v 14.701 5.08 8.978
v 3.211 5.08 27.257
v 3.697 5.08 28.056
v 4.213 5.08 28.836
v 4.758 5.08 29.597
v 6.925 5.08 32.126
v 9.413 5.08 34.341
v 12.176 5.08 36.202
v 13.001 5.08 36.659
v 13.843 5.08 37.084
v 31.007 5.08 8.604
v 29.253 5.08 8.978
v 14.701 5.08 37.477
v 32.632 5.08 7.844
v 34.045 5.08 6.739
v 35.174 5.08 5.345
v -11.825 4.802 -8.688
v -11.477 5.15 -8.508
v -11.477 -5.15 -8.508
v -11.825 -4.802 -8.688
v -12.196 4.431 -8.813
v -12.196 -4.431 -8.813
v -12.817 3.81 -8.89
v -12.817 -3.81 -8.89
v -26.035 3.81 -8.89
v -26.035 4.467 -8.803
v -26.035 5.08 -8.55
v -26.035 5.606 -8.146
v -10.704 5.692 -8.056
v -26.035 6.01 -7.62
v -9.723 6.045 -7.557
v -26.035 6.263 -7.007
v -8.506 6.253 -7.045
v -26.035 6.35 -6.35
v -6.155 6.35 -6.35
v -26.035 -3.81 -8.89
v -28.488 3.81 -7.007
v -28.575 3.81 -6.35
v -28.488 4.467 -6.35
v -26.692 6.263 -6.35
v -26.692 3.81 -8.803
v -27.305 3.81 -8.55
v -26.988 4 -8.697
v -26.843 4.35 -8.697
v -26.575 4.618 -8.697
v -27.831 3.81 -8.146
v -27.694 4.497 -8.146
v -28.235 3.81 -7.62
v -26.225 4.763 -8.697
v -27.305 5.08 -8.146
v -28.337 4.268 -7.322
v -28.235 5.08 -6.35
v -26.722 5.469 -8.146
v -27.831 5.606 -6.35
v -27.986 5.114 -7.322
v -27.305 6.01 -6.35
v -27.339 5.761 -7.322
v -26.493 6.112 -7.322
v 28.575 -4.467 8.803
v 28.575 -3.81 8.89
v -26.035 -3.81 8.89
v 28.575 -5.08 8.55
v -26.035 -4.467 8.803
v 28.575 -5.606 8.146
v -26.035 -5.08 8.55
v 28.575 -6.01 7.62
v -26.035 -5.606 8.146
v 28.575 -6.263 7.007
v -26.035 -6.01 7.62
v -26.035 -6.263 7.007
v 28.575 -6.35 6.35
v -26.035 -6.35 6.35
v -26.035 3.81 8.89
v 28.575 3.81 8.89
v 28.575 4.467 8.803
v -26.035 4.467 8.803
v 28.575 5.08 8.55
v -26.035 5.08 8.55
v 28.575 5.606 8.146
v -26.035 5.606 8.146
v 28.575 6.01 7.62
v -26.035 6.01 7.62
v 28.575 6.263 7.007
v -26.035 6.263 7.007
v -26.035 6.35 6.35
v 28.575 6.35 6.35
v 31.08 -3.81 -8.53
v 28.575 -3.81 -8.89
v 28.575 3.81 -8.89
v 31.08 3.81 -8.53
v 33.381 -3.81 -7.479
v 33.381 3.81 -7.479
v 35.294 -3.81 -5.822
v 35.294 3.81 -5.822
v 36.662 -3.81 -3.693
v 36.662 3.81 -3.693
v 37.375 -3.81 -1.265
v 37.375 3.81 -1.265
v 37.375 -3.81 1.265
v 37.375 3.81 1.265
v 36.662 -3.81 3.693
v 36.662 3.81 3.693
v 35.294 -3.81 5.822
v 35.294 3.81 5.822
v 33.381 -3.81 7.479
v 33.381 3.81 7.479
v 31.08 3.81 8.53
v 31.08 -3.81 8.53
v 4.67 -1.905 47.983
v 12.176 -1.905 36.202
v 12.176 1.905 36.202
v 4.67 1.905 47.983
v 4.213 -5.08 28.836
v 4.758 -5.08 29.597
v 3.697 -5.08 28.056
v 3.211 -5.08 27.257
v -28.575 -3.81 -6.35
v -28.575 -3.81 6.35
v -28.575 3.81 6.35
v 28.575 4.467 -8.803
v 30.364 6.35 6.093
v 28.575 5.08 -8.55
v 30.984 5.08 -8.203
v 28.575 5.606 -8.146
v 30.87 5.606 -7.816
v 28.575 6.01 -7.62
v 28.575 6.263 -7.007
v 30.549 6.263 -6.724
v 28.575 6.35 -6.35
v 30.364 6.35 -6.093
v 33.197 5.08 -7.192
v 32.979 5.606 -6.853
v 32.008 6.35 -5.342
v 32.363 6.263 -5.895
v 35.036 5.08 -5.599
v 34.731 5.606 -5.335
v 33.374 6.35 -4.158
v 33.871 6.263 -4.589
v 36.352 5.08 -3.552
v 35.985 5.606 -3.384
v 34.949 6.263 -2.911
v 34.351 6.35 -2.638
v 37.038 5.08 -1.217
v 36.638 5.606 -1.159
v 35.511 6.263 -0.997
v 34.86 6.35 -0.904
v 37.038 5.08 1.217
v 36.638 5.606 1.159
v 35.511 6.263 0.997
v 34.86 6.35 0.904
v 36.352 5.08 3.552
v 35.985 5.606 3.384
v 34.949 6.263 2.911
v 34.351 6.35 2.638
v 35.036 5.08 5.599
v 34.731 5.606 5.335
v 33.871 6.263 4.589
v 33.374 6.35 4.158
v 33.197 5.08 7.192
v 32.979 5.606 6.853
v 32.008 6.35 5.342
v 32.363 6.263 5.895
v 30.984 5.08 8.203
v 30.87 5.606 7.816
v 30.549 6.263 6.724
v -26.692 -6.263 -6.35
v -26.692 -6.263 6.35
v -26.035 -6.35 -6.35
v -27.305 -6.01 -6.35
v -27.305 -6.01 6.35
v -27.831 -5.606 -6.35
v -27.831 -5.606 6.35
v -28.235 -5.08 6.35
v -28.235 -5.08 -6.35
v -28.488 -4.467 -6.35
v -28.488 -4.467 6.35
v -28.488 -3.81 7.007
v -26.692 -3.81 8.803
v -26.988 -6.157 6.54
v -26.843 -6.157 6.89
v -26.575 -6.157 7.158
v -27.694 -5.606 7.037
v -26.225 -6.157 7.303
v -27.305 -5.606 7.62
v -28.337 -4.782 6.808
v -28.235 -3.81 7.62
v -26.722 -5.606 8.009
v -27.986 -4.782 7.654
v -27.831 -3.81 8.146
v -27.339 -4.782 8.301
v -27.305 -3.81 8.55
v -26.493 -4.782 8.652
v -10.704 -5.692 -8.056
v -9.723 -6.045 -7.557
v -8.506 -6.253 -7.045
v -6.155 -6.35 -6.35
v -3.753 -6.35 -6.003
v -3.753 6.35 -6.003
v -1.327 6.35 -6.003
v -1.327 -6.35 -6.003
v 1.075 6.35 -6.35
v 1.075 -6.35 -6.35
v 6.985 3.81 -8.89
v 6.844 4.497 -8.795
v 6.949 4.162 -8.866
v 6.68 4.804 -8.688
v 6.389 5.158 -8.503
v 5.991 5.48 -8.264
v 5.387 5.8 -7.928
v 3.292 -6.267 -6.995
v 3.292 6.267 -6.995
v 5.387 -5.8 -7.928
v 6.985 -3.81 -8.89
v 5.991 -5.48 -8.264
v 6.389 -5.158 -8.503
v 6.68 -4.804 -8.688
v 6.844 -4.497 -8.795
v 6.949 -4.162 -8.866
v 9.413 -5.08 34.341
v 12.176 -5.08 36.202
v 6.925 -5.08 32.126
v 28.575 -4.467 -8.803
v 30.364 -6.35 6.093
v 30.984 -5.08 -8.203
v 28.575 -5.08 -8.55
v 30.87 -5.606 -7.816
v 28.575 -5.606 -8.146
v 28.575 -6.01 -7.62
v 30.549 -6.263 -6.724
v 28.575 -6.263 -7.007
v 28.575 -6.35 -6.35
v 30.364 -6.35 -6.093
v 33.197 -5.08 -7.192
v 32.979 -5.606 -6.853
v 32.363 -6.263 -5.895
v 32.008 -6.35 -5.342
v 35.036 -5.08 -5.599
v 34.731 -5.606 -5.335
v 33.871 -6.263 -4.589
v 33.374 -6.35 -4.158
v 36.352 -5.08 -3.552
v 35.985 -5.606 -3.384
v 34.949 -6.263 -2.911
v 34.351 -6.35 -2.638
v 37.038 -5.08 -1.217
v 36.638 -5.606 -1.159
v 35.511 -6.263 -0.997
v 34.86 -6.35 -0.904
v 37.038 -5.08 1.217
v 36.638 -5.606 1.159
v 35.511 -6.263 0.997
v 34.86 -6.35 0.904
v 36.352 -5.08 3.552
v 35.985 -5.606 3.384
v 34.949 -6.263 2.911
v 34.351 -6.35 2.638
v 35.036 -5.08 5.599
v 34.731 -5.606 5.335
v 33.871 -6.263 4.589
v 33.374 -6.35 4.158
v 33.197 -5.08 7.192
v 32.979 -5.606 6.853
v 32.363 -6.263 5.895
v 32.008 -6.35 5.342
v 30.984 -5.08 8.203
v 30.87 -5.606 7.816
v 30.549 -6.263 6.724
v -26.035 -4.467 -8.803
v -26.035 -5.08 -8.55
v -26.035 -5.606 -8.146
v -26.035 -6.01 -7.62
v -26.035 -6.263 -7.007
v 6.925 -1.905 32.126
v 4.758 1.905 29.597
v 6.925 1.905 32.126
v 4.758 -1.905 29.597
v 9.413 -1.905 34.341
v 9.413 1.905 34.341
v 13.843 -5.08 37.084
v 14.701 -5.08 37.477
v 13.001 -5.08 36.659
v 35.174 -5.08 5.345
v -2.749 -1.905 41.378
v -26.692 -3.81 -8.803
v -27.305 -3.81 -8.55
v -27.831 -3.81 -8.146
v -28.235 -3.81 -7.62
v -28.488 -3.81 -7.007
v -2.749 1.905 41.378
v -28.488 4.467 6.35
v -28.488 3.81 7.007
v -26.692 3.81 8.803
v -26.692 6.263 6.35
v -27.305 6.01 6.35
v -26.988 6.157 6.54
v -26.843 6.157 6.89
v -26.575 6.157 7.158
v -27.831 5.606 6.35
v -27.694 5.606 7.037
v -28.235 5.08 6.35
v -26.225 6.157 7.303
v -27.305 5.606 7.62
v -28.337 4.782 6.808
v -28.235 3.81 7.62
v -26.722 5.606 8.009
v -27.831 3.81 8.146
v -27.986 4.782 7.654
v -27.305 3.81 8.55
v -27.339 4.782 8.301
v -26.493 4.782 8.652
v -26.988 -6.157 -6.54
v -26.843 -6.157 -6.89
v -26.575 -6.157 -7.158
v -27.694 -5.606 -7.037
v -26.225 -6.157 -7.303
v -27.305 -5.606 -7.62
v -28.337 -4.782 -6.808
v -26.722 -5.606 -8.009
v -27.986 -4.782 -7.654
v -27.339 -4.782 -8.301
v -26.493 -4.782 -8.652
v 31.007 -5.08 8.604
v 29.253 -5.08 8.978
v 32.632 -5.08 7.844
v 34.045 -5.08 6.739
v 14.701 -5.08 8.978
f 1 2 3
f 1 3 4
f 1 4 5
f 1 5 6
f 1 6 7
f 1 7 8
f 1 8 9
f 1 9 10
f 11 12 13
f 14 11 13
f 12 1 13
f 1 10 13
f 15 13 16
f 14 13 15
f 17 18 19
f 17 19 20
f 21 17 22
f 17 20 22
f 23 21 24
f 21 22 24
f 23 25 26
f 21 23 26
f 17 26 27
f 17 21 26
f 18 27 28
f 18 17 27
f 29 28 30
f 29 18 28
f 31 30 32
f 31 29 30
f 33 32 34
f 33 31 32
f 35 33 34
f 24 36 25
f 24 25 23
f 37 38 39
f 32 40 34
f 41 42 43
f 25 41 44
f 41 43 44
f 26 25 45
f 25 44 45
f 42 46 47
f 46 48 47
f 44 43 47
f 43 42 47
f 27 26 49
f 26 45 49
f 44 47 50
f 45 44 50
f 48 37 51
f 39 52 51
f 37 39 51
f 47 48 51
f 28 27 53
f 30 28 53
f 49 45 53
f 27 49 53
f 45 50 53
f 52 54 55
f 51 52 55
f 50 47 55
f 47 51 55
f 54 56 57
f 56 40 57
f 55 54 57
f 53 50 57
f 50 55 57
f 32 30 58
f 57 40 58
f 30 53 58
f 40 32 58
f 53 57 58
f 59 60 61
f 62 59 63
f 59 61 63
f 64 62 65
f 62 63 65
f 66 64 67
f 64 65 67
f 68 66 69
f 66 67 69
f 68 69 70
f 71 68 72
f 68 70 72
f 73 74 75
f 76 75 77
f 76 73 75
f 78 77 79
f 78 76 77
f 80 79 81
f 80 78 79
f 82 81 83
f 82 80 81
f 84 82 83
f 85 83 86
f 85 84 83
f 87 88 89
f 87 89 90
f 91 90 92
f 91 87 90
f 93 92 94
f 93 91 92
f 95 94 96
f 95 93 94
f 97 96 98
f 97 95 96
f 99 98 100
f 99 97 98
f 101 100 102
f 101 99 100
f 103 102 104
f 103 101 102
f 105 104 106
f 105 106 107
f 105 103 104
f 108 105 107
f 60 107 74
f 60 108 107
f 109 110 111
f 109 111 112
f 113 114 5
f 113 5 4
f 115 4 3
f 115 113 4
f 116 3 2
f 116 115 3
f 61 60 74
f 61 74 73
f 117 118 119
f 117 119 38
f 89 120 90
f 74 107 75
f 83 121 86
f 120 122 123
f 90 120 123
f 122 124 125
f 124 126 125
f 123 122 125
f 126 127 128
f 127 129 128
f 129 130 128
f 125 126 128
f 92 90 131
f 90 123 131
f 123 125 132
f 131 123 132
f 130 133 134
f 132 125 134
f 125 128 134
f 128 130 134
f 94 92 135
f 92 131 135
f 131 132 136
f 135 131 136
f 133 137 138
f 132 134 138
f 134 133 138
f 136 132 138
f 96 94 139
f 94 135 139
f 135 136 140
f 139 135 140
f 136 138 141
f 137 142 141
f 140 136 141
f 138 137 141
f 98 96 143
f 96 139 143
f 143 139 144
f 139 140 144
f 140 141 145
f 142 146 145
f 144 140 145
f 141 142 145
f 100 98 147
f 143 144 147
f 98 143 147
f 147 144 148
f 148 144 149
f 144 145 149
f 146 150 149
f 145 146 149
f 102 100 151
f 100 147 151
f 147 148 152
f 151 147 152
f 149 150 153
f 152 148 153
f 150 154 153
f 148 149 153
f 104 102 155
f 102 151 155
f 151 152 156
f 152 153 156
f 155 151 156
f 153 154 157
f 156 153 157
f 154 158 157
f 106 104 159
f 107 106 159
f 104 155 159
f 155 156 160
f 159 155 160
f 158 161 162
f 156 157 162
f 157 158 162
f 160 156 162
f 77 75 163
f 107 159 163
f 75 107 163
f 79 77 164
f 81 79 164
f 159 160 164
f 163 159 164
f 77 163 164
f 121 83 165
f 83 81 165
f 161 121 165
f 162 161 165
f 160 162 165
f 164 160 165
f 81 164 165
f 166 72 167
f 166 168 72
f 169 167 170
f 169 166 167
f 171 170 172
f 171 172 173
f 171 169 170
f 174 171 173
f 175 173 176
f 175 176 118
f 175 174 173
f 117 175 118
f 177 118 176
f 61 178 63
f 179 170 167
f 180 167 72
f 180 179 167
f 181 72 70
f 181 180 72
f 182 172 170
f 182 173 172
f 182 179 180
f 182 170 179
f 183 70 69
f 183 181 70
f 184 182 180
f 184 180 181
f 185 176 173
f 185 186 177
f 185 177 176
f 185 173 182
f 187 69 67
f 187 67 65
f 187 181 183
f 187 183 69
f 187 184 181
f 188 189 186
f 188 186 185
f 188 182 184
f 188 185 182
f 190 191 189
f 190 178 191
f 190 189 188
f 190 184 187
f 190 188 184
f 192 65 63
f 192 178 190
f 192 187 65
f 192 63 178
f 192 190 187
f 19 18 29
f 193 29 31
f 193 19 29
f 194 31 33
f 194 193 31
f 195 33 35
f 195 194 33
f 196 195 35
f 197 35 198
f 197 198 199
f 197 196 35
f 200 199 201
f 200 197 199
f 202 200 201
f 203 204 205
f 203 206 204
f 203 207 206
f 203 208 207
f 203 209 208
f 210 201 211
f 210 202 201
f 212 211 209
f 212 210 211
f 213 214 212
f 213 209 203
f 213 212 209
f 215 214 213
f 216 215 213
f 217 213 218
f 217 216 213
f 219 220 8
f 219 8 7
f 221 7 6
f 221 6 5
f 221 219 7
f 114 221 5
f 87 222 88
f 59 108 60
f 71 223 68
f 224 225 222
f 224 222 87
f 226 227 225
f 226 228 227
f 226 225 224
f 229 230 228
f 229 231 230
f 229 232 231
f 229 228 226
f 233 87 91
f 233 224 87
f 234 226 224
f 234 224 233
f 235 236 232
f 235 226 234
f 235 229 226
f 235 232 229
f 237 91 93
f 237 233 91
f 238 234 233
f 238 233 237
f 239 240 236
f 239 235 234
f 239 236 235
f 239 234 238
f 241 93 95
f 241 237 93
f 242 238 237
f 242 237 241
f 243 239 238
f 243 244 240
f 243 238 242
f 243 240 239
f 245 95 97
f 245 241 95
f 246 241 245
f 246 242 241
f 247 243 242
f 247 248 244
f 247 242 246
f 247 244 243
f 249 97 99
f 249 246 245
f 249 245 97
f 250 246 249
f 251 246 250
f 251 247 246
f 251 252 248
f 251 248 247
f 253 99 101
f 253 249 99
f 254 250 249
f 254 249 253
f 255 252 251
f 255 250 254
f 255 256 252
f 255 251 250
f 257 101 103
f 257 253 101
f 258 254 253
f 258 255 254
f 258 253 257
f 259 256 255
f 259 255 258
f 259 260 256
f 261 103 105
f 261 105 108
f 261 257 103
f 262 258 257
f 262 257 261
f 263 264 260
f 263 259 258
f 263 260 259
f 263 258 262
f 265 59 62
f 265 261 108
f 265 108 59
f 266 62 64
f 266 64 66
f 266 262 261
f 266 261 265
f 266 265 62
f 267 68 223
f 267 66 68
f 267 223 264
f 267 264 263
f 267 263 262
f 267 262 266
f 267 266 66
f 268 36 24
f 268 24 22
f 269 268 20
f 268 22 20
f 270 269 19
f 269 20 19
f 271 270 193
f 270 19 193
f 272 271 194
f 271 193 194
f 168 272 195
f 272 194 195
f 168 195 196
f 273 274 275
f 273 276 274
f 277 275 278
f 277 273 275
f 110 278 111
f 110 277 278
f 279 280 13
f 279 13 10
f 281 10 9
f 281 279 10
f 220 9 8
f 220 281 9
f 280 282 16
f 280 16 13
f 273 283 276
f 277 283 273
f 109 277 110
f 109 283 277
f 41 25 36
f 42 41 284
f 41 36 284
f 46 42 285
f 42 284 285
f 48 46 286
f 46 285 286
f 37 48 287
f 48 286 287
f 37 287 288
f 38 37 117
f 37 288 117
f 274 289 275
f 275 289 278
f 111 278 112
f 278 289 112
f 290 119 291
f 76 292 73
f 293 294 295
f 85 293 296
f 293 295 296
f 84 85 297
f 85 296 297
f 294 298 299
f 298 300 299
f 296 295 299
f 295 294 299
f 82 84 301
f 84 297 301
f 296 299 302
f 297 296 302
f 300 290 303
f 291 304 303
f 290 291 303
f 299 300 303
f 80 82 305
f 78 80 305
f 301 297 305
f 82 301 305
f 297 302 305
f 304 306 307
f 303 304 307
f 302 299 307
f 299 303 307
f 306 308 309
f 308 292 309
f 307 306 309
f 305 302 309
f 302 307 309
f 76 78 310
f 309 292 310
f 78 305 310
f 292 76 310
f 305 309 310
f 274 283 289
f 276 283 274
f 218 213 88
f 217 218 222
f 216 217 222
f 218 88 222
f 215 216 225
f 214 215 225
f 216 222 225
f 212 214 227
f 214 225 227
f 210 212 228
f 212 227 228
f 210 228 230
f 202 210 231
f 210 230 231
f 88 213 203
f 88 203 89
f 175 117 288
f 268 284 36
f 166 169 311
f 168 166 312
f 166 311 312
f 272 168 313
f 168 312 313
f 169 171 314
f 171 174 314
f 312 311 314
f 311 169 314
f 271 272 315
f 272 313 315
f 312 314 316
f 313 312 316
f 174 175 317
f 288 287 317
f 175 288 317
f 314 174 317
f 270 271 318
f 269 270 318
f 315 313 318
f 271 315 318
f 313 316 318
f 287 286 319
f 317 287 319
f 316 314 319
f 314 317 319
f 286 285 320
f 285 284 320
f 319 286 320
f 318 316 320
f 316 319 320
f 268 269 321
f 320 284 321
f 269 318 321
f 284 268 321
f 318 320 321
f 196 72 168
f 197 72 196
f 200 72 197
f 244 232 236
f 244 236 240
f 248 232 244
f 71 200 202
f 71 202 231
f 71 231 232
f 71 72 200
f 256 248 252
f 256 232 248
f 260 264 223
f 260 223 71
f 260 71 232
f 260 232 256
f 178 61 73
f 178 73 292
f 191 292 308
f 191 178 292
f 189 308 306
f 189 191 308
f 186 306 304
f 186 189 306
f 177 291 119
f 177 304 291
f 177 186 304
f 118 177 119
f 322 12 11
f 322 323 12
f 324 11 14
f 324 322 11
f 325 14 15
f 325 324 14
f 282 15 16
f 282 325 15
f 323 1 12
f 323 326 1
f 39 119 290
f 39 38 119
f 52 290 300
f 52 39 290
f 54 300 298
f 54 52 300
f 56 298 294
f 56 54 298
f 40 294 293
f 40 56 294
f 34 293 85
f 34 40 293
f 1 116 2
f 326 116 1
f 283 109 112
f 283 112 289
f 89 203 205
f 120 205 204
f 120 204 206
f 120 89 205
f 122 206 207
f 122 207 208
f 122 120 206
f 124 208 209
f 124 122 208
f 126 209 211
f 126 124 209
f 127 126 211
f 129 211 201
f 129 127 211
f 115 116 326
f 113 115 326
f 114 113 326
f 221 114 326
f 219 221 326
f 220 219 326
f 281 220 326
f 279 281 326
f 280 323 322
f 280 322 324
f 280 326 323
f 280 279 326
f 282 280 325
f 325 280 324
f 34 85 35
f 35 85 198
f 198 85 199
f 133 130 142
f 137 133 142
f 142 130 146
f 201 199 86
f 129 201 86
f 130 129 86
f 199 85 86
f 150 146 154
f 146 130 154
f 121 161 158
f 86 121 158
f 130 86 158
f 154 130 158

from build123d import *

# Parameters (mm, degrees)
F2_DEPTH = 6.35
F3_DEPTH = 1.905
F4_DEPTH = 5.08
F5_R     = 2.54


with BuildPart() as f2:
    # F0 (on Front) → F2 (new body, symmetric)
    with BuildSketch(Plane.XZ):
        with BuildLine():
            Line((28.575, 8.89), (-28.575, 8.89))
            Line((-28.575, 8.89), (-28.575, -8.89))
            Line((-28.575, -8.89), (-12.065, -8.89))
            ThreePointArc((-12.065, -8.89), (-2.54, -5.959902), (6.985, -8.89))
            Line((6.985, -8.89), (28.575, -8.89))
            ThreePointArc((28.575, -8.89), (37.465, 0), (28.575, 8.89))
        make_face()
    extrude(amount=F2_DEPTH, both=True)

    # F5
    f5_edges = [f2.edges().sort_by_distance(p)[0] for p in [
        (-28.575, 0, 8.89),
        (-28.575, 6.35, 0),
        (-28.575, 0, -8.89),
        (-28.575, -6.35, 0),
        (28.575, 0, 8.89),
        (0, 6.35, 8.89),
        (0, -6.35, 8.89),
        (-20.32, 6.35, -8.89),
        (-12.065, 0, -8.89),
        (-20.32, -6.35, -8.89),
    ]]
    fillet(f5_edges, radius=F5_R)


with BuildPart() as f3:
    # F1 (on Front) → F3 (new body, symmetric)
    with BuildSketch(Plane.XZ):
        with BuildLine():
            ThreePointArc((4.757753, 29.596718), (8.131813, 33.275813), (12.176494, 36.201658))
            Line((12.176494, 36.201658), (4.669598, 47.983314))
            Line((4.669598, 47.983314), (-2.749143, 41.378374))
            Line((-2.749143, 41.378374), (4.757753, 29.596718))
        make_face()
    extrude(amount=F3_DEPTH, both=True)


with BuildPart() as f4:
    # F1 (on Front) → F4 (new body, symmetric)
    with BuildSketch(Plane.XZ):
        with BuildLine():
            ThreePointArc((29.252851, 8.978334), (32.632292, 7.844278), (35.174159, 5.345156))
            Line((35.174159, 5.345156), (14.700807, 37.476945))
            ThreePointArc((14.700807, 37.476945), (13.42039, 36.875447), (12.176494, 36.201658))
            ThreePointArc((12.176494, 36.201658), (8.131813, 33.275813), (4.757753, 29.596718))
            ThreePointArc((4.757753, 29.596718), (3.950986, 28.448768), (3.210678, 27.256875))
            Line((3.210678, 27.256875), (14.700807, 8.978334))
            Line((14.700807, 8.978334), (29.252851, 8.978334))
        make_face()
    extrude(amount=F4_DEPTH, both=True)


solid = Compound([f2.part, f3.part, f4.part])
